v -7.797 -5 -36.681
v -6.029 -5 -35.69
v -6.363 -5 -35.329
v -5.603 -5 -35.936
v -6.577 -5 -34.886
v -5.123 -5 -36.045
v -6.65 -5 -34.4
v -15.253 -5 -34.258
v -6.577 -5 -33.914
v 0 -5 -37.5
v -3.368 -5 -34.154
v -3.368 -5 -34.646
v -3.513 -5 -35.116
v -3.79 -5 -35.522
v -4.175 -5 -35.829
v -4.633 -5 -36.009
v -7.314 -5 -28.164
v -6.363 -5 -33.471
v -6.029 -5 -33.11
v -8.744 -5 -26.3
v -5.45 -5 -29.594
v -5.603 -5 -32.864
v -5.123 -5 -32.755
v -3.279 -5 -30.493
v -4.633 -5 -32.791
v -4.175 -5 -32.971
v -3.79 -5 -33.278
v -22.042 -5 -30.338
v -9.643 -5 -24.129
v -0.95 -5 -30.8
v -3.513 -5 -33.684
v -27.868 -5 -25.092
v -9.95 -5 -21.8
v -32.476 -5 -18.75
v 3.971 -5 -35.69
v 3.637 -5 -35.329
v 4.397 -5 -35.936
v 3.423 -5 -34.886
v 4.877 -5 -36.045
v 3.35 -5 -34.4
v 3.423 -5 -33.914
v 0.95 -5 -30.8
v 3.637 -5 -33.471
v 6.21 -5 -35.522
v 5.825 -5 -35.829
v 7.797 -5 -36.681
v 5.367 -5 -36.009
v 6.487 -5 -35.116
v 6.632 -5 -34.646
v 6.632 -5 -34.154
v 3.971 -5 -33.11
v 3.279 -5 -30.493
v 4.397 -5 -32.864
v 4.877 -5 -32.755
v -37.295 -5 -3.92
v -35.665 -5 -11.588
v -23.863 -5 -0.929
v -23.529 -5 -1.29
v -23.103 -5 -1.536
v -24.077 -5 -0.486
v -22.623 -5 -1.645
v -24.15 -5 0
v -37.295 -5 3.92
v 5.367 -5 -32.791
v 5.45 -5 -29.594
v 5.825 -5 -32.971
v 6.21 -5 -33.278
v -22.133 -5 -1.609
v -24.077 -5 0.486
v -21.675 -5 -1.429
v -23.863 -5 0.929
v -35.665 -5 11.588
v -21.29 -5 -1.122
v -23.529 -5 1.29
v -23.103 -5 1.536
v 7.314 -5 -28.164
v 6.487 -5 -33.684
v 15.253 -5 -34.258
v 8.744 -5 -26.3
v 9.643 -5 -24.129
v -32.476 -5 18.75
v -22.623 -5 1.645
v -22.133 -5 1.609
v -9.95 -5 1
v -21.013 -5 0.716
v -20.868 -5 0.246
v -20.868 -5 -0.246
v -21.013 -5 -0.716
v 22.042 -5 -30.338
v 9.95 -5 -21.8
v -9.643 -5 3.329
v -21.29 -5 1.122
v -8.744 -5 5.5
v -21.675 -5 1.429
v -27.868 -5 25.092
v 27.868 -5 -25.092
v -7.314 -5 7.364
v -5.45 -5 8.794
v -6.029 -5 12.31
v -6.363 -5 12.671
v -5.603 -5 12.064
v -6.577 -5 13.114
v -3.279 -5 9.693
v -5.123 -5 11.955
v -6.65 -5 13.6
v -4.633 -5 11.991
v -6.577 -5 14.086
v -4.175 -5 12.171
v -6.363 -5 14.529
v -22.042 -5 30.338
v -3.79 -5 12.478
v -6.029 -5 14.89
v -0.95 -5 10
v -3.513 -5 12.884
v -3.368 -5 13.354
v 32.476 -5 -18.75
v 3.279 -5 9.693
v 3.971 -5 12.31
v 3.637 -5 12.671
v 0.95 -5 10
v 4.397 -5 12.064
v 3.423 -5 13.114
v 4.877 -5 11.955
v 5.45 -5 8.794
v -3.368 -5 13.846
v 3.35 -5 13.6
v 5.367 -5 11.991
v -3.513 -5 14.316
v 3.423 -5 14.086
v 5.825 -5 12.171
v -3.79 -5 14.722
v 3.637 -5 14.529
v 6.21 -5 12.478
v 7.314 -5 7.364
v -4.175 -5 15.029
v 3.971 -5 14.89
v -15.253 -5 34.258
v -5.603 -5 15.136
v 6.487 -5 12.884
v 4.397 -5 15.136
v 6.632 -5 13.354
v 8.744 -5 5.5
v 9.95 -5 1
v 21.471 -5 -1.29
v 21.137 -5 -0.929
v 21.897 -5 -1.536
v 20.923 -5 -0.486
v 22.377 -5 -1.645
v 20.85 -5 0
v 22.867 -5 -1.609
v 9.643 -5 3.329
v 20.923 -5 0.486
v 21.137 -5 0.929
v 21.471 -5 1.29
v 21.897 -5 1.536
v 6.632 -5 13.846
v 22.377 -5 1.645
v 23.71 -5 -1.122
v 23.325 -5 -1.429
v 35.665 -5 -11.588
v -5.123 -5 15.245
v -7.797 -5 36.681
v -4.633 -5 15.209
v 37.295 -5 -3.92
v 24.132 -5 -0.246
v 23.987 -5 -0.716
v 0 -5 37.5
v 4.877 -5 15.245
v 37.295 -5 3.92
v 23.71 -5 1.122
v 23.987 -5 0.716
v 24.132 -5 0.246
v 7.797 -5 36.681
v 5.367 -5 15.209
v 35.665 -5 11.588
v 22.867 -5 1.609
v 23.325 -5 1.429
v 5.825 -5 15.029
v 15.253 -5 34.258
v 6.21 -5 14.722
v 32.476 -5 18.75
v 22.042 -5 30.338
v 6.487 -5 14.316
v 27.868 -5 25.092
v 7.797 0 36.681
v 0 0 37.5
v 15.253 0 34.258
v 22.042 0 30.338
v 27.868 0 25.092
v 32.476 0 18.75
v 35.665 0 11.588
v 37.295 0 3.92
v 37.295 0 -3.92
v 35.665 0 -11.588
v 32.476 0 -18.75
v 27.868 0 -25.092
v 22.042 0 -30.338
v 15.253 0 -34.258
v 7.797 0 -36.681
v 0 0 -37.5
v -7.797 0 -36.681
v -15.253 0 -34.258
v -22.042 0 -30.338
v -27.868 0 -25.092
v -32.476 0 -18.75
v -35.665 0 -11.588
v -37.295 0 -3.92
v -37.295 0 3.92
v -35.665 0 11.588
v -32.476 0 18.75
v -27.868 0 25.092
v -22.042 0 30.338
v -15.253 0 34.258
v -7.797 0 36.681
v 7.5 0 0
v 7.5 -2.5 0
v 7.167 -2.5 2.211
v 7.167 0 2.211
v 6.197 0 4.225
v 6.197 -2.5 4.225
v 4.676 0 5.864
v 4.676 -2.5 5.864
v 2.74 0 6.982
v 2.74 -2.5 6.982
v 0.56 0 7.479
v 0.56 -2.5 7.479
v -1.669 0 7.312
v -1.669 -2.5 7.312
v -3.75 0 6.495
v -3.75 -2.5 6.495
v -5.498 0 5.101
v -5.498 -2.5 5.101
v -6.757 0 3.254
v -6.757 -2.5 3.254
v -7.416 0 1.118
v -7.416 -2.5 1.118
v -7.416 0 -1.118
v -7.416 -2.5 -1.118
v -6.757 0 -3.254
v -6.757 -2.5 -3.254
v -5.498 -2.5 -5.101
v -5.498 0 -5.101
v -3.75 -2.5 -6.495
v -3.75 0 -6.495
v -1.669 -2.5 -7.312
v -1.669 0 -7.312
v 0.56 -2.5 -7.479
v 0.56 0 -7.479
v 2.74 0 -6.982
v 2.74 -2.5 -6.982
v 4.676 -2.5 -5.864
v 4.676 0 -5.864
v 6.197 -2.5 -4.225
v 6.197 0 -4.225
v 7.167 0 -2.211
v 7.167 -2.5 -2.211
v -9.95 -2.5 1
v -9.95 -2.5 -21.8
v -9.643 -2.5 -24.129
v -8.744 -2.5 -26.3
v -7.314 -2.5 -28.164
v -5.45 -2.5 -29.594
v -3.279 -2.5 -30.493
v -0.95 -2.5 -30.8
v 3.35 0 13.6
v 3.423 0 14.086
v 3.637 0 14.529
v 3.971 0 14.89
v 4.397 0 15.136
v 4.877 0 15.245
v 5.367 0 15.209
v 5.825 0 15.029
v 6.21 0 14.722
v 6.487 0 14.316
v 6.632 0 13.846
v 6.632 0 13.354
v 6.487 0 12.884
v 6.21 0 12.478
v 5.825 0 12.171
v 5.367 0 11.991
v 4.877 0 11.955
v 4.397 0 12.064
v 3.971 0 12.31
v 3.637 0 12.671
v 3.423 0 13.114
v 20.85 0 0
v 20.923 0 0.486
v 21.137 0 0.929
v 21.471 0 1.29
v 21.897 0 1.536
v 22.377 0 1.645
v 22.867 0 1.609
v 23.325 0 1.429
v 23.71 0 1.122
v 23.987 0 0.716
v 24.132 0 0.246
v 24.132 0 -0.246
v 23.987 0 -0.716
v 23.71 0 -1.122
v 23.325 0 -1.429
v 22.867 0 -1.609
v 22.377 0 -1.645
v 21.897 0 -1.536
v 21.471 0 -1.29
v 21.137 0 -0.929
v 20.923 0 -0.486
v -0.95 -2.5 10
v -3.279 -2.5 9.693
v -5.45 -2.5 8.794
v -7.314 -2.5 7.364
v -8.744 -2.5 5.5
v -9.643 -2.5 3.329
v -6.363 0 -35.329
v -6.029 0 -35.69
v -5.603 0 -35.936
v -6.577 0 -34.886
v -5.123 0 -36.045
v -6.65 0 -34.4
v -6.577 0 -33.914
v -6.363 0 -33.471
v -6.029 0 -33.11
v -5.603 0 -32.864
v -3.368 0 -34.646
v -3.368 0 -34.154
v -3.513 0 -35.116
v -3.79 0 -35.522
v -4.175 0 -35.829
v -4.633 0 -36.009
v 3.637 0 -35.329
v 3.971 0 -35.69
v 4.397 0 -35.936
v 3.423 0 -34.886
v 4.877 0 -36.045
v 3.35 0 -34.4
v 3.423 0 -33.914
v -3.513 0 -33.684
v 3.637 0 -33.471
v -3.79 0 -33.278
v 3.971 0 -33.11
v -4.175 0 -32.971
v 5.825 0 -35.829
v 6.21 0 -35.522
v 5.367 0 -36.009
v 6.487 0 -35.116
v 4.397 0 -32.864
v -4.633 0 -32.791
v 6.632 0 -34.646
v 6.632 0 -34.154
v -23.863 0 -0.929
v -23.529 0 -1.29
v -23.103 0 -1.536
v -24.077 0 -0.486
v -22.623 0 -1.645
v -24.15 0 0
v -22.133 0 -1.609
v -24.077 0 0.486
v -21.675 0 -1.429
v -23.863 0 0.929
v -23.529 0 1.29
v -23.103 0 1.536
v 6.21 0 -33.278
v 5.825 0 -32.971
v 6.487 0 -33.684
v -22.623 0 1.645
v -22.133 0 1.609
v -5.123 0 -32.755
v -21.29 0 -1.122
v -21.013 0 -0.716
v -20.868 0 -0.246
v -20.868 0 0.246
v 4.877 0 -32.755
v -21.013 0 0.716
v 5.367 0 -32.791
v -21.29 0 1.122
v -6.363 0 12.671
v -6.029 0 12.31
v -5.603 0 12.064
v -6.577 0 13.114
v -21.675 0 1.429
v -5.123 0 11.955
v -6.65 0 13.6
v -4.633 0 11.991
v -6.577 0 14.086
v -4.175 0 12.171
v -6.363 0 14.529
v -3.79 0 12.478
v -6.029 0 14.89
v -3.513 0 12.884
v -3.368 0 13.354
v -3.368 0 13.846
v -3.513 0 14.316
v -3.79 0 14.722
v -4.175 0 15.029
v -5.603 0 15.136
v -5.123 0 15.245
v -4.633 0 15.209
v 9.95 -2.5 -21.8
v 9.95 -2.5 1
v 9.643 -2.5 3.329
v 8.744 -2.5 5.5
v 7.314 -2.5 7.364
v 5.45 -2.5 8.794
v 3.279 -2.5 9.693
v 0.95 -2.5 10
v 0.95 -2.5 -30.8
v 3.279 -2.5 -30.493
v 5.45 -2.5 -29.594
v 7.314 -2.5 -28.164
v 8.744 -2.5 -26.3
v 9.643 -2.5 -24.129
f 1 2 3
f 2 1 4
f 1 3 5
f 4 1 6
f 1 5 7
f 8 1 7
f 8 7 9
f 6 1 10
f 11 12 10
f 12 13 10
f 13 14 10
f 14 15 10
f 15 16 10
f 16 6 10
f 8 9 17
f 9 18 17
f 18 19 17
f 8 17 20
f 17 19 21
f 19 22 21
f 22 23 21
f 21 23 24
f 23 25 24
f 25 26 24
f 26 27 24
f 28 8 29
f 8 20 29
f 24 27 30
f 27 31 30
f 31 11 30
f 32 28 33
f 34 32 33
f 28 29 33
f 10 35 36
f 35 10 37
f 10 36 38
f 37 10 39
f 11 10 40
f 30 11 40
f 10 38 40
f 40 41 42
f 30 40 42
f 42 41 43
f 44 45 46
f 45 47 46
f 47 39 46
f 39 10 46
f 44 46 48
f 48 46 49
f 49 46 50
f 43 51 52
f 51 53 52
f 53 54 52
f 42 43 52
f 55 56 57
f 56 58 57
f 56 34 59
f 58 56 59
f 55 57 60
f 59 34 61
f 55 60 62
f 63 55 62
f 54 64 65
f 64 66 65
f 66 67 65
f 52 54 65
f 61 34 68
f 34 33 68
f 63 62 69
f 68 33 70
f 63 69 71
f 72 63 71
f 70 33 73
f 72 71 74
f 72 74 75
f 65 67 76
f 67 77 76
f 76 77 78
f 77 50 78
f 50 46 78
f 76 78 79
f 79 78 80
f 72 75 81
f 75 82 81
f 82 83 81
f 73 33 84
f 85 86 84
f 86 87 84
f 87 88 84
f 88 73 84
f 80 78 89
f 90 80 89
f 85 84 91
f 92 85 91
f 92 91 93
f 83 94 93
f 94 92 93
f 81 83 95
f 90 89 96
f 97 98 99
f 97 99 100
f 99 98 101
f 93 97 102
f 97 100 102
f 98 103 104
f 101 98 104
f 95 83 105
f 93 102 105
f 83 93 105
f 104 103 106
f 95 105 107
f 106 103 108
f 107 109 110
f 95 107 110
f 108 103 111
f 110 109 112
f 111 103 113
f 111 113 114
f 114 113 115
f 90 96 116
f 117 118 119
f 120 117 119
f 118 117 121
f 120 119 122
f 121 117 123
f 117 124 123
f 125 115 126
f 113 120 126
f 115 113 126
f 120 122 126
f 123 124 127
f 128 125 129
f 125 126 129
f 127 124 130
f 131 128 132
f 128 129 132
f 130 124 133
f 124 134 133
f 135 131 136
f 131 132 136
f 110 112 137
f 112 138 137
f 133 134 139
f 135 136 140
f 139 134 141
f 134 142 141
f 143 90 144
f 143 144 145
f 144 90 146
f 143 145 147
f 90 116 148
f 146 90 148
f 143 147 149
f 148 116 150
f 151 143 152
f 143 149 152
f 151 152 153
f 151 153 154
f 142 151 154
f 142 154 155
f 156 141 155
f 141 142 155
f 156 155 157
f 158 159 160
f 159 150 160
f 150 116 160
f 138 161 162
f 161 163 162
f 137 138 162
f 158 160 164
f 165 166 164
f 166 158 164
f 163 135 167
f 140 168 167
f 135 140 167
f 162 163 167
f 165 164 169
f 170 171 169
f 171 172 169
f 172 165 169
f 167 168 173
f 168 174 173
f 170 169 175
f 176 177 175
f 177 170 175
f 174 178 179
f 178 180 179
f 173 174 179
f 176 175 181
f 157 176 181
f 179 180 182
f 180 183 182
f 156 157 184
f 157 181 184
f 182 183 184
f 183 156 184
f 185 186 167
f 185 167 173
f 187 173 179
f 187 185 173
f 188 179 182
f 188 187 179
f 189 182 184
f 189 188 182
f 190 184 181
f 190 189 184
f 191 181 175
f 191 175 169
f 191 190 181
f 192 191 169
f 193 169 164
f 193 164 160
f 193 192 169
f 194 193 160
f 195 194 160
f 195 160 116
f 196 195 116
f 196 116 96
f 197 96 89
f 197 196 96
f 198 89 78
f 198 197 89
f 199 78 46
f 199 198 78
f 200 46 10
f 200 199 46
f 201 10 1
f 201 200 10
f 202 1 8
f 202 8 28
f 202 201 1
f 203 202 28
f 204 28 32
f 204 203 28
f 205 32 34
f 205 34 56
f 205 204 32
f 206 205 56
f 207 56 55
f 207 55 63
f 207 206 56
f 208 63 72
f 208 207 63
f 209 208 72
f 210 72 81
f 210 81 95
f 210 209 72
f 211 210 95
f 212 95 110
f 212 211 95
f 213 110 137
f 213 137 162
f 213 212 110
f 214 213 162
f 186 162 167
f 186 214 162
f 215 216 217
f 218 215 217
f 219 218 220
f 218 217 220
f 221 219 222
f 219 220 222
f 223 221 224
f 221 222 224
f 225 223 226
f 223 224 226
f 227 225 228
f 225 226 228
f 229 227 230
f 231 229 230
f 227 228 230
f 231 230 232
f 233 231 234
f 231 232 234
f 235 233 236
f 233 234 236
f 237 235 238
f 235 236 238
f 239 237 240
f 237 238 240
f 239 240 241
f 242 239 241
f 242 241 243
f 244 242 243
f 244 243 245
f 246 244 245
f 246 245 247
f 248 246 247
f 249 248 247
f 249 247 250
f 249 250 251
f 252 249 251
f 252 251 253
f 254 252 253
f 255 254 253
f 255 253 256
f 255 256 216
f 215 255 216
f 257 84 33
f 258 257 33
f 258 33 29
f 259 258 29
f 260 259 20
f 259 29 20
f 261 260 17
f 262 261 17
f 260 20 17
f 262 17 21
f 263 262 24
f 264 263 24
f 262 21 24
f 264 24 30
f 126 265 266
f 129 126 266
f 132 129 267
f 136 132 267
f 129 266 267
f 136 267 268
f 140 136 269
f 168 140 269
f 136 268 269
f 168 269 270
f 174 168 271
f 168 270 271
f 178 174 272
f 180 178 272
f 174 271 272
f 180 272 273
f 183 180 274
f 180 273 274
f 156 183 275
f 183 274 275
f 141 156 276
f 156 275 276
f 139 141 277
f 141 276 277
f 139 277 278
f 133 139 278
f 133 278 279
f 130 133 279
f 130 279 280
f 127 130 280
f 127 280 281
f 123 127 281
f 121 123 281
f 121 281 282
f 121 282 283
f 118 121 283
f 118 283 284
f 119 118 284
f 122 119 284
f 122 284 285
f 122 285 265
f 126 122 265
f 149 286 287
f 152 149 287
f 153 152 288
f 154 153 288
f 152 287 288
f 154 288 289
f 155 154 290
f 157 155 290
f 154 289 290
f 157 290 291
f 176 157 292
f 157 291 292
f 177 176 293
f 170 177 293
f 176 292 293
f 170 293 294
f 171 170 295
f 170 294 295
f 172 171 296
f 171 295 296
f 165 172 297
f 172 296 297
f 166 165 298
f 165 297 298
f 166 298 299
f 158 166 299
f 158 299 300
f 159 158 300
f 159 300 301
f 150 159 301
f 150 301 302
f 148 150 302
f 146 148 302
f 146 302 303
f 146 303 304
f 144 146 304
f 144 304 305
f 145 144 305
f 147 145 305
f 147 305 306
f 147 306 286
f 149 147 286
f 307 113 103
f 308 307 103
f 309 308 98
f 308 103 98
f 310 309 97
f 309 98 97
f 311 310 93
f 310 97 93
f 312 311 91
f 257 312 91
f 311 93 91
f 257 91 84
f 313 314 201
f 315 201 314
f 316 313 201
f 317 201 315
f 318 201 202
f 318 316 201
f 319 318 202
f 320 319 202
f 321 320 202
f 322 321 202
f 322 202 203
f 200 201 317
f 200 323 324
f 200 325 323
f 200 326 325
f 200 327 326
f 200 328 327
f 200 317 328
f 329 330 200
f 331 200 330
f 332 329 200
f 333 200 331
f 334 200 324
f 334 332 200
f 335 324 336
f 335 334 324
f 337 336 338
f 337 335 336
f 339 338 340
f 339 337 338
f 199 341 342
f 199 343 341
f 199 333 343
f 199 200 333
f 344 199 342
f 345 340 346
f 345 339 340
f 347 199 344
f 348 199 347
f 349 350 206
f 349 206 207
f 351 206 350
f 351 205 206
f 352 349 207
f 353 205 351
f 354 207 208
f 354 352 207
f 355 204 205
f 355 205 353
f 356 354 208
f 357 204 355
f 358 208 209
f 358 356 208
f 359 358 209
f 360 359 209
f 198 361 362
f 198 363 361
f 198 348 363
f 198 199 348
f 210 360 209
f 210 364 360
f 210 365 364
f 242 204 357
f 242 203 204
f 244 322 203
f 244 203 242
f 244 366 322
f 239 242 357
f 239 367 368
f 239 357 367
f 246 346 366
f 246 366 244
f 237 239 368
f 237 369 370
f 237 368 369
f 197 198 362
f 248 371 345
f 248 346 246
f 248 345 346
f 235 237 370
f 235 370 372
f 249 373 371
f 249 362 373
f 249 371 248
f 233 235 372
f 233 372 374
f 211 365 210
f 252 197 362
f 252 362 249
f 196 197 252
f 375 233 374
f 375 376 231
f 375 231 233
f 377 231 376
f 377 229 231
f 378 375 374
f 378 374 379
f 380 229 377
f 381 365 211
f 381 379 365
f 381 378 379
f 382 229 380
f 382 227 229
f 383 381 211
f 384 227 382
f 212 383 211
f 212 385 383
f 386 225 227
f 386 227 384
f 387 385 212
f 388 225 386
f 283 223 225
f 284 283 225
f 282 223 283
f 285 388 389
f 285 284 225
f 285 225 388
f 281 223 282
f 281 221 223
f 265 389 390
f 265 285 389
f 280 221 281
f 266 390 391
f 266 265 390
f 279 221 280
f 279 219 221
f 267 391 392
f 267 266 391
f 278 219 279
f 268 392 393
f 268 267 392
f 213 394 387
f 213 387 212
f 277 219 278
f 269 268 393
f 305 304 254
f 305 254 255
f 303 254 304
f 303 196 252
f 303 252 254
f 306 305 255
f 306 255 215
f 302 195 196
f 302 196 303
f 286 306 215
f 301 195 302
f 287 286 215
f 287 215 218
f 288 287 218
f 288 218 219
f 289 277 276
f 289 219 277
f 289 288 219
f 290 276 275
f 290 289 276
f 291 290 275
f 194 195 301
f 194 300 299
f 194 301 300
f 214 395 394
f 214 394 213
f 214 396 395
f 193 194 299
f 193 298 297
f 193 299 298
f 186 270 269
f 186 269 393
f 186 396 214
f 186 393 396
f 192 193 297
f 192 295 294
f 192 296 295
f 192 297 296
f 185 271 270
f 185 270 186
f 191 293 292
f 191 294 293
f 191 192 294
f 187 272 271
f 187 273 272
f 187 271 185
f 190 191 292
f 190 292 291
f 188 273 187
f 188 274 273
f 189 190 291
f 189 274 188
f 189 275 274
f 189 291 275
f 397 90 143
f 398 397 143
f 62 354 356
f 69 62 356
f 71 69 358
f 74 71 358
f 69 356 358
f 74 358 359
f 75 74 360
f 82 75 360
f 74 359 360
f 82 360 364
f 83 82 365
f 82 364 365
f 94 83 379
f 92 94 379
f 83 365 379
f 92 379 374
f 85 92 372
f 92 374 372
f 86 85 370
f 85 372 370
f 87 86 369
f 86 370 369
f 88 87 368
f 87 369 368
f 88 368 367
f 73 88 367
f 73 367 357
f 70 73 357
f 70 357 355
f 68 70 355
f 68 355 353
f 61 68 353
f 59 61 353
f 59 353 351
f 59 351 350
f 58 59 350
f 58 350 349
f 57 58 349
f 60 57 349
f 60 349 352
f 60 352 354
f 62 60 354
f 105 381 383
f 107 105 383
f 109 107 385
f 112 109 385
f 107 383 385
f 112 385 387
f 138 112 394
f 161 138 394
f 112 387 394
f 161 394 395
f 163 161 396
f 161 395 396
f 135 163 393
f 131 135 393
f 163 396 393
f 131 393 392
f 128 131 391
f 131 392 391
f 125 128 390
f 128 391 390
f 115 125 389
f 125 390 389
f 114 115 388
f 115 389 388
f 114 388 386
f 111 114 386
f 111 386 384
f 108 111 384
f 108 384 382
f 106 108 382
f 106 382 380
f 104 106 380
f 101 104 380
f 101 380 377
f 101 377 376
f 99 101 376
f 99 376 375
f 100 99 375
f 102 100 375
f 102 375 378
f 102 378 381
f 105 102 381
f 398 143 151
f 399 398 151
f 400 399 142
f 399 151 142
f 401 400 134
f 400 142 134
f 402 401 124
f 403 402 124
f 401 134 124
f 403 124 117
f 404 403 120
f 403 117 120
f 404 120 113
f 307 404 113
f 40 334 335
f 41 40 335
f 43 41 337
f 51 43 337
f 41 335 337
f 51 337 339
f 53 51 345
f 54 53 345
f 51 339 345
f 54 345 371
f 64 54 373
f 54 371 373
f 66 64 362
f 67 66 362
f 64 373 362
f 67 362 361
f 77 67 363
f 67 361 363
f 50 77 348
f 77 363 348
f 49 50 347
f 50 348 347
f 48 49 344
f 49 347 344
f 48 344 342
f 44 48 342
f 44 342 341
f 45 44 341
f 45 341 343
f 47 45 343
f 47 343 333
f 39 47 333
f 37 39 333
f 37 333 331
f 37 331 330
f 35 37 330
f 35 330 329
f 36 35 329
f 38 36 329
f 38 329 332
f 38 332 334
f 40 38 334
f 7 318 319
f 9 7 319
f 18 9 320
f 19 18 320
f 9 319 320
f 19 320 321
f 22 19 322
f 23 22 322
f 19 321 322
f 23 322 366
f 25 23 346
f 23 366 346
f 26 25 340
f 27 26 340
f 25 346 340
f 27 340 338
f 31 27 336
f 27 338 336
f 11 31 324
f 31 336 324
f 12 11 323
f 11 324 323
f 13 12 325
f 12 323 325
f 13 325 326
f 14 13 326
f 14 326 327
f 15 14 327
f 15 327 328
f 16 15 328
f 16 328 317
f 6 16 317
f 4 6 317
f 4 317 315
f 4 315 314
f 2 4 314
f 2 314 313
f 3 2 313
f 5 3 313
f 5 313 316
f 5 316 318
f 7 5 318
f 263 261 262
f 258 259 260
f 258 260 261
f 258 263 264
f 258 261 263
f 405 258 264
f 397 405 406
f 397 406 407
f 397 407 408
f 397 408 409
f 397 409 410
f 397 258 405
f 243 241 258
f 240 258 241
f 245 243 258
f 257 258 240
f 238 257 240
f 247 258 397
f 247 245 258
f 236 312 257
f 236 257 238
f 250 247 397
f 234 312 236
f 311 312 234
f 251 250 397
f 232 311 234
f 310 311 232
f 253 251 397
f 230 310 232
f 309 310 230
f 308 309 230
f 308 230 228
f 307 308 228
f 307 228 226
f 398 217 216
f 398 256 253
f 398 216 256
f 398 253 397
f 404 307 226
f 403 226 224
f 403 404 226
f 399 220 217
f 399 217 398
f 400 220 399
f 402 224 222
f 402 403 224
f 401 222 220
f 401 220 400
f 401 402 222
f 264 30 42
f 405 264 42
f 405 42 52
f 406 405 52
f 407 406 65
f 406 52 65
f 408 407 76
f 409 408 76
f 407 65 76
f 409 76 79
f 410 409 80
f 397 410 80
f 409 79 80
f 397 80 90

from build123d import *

# Parameters (mm, degrees)
ESQUISSE1_R             = 37.5
EXTRUSION1_DEPTH        = 5
ENL_V_MAT_EXTRU_2_DEPTH = 2.5
ESQUISSE7_R             = 7.5
ENL_V_MAT_EXTRU_3_DEPTH = 54.091901454
TROU_TARAUD_M4X0_71_D   = 3.3


with BuildPart() as part:
    # Esquisse1 → Extrusion1 (new body)
    with BuildSketch(Plane(origin=(0, 0, 0), x_dir=(1, 0, 0), z_dir=(0, 1, 0))):
        with Locations(Location((0, 0, 0), (0, 0, 270))):
            Circle(ESQUISSE1_R)
    extrude(amount=-EXTRUSION1_DEPTH)

    # Esquisse6 → Enlèv. mat.-Extru.2 (cut)
    with BuildSketch(Plane.XZ.offset(5)):
        with BuildLine():
            Line((-9.95, 1), (-9.95, -21.8))
            ThreePointArc((-9.95, -21.8), (-7.313961031, -28.163961031), (-0.95, -30.8))
            Line((-0.95, -30.8), (0.95, -30.8))
            ThreePointArc((0.95, -30.8), (7.313961031, -28.163961031), (9.95, -21.8))
            Line((9.95, -21.8), (9.95, 1))
            ThreePointArc((9.95, 1), (7.313961031, 7.363961031), (0.95, 10))
            Line((0.95, 10), (-0.95, 10))
            ThreePointArc((-0.95, 10), (-7.313961031, 7.363961031), (-9.95, 1))
        make_face()
    extrude(amount=-ENL_V_MAT_EXTRU_2_DEPTH, mode=Mode.SUBTRACT)

    # Esquisse7 → Enlèv. mat.-Extru.3 (cut, through all)
    with BuildSketch(Plane.XZ.offset(2.5)):
        Circle(ESQUISSE7_R)
    extrude(amount=-ENL_V_MAT_EXTRU_3_DEPTH, mode=Mode.SUBTRACT)

    # Trou taraudé M4x0.71 (through all)
    with Locations(Plane.XZ.offset(5)):
        with Locations((-5, -34.4), (5, -34.4), (-5, 13.6), (5, 13.6), (22.5, 0), (-22.5, 0)):
            Hole(TROU_TARAUD_M4X0_71_D / 2)


solid = part.part
